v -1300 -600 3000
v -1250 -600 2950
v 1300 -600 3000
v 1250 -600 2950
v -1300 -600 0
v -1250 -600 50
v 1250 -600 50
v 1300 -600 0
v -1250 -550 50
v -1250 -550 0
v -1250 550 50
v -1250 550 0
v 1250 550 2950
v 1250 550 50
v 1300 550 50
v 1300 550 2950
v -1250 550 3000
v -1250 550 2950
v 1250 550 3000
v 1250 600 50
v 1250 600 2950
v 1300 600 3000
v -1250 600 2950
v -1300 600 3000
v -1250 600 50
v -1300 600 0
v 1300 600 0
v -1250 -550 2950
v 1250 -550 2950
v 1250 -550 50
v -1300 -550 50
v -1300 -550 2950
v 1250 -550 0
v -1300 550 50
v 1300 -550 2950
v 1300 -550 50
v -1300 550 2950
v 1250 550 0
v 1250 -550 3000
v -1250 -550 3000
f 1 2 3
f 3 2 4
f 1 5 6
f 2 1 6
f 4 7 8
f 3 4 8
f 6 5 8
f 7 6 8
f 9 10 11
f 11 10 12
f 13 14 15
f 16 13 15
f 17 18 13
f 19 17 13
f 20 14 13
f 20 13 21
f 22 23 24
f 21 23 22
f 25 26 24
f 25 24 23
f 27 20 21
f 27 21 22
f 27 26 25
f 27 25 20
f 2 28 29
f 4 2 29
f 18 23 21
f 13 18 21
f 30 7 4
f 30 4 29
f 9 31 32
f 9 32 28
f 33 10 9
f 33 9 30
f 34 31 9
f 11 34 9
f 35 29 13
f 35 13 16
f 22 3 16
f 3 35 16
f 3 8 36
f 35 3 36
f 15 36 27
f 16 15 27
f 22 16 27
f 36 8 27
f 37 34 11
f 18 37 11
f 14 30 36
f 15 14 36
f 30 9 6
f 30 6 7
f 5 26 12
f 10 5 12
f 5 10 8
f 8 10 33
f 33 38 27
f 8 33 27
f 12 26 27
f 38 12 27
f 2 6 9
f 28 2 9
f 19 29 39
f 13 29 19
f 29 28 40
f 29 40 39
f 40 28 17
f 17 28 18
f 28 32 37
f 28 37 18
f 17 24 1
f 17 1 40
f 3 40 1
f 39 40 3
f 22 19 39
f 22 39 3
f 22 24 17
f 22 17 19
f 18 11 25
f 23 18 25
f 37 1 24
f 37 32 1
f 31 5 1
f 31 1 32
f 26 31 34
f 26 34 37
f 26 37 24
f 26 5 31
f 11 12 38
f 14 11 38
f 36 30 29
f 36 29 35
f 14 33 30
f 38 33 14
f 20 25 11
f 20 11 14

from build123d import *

# Parameters (mm, degrees)
F0_W     = 2600
F0_H     = 1200
F0_W_2   = 2500
F0_H_2   = 1100
F1_DEPTH = 50
F2_W     = 50
F2_H     = 50
F3_DEPTH = 2900
F4_W     = 2600
F4_H     = 1200
F4_W_2   = 2500
F4_H_2   = 1100
F5_DEPTH = 50


with BuildPart() as f1:
    # F0 (on Top) → F1 (new body)
    with BuildSketch(Plane.XY):
        Rectangle(F0_W, F0_H)
        Rectangle(F0_W_2, F0_H_2, mode=Mode.SUBTRACT)
    extrude(amount=F1_DEPTH)

    # F2 (on face) → F3 (join)
    with BuildSketch(Plane.XY.offset(50)):
        with Locations((-1275, 575)):
            Rectangle(F2_W, F2_H)
        with Locations((1275, 575)):
            Rectangle(F2_W, F2_H)
        with Locations((1275, -575)):
            Rectangle(F2_W, F2_H)
        with Locations((-1275, -575)):
            Rectangle(F2_W, F2_H)
    extrude(amount=F3_DEPTH)

    # F4 (on face) → F5 (join)
    with BuildSketch(Plane.XY.offset(2950)):
        Rectangle(F4_W, F4_H)
        Rectangle(F4_W_2, F4_H_2, mode=Mode.SUBTRACT)
    extrude(amount=F5_DEPTH)


solid = f1.part
